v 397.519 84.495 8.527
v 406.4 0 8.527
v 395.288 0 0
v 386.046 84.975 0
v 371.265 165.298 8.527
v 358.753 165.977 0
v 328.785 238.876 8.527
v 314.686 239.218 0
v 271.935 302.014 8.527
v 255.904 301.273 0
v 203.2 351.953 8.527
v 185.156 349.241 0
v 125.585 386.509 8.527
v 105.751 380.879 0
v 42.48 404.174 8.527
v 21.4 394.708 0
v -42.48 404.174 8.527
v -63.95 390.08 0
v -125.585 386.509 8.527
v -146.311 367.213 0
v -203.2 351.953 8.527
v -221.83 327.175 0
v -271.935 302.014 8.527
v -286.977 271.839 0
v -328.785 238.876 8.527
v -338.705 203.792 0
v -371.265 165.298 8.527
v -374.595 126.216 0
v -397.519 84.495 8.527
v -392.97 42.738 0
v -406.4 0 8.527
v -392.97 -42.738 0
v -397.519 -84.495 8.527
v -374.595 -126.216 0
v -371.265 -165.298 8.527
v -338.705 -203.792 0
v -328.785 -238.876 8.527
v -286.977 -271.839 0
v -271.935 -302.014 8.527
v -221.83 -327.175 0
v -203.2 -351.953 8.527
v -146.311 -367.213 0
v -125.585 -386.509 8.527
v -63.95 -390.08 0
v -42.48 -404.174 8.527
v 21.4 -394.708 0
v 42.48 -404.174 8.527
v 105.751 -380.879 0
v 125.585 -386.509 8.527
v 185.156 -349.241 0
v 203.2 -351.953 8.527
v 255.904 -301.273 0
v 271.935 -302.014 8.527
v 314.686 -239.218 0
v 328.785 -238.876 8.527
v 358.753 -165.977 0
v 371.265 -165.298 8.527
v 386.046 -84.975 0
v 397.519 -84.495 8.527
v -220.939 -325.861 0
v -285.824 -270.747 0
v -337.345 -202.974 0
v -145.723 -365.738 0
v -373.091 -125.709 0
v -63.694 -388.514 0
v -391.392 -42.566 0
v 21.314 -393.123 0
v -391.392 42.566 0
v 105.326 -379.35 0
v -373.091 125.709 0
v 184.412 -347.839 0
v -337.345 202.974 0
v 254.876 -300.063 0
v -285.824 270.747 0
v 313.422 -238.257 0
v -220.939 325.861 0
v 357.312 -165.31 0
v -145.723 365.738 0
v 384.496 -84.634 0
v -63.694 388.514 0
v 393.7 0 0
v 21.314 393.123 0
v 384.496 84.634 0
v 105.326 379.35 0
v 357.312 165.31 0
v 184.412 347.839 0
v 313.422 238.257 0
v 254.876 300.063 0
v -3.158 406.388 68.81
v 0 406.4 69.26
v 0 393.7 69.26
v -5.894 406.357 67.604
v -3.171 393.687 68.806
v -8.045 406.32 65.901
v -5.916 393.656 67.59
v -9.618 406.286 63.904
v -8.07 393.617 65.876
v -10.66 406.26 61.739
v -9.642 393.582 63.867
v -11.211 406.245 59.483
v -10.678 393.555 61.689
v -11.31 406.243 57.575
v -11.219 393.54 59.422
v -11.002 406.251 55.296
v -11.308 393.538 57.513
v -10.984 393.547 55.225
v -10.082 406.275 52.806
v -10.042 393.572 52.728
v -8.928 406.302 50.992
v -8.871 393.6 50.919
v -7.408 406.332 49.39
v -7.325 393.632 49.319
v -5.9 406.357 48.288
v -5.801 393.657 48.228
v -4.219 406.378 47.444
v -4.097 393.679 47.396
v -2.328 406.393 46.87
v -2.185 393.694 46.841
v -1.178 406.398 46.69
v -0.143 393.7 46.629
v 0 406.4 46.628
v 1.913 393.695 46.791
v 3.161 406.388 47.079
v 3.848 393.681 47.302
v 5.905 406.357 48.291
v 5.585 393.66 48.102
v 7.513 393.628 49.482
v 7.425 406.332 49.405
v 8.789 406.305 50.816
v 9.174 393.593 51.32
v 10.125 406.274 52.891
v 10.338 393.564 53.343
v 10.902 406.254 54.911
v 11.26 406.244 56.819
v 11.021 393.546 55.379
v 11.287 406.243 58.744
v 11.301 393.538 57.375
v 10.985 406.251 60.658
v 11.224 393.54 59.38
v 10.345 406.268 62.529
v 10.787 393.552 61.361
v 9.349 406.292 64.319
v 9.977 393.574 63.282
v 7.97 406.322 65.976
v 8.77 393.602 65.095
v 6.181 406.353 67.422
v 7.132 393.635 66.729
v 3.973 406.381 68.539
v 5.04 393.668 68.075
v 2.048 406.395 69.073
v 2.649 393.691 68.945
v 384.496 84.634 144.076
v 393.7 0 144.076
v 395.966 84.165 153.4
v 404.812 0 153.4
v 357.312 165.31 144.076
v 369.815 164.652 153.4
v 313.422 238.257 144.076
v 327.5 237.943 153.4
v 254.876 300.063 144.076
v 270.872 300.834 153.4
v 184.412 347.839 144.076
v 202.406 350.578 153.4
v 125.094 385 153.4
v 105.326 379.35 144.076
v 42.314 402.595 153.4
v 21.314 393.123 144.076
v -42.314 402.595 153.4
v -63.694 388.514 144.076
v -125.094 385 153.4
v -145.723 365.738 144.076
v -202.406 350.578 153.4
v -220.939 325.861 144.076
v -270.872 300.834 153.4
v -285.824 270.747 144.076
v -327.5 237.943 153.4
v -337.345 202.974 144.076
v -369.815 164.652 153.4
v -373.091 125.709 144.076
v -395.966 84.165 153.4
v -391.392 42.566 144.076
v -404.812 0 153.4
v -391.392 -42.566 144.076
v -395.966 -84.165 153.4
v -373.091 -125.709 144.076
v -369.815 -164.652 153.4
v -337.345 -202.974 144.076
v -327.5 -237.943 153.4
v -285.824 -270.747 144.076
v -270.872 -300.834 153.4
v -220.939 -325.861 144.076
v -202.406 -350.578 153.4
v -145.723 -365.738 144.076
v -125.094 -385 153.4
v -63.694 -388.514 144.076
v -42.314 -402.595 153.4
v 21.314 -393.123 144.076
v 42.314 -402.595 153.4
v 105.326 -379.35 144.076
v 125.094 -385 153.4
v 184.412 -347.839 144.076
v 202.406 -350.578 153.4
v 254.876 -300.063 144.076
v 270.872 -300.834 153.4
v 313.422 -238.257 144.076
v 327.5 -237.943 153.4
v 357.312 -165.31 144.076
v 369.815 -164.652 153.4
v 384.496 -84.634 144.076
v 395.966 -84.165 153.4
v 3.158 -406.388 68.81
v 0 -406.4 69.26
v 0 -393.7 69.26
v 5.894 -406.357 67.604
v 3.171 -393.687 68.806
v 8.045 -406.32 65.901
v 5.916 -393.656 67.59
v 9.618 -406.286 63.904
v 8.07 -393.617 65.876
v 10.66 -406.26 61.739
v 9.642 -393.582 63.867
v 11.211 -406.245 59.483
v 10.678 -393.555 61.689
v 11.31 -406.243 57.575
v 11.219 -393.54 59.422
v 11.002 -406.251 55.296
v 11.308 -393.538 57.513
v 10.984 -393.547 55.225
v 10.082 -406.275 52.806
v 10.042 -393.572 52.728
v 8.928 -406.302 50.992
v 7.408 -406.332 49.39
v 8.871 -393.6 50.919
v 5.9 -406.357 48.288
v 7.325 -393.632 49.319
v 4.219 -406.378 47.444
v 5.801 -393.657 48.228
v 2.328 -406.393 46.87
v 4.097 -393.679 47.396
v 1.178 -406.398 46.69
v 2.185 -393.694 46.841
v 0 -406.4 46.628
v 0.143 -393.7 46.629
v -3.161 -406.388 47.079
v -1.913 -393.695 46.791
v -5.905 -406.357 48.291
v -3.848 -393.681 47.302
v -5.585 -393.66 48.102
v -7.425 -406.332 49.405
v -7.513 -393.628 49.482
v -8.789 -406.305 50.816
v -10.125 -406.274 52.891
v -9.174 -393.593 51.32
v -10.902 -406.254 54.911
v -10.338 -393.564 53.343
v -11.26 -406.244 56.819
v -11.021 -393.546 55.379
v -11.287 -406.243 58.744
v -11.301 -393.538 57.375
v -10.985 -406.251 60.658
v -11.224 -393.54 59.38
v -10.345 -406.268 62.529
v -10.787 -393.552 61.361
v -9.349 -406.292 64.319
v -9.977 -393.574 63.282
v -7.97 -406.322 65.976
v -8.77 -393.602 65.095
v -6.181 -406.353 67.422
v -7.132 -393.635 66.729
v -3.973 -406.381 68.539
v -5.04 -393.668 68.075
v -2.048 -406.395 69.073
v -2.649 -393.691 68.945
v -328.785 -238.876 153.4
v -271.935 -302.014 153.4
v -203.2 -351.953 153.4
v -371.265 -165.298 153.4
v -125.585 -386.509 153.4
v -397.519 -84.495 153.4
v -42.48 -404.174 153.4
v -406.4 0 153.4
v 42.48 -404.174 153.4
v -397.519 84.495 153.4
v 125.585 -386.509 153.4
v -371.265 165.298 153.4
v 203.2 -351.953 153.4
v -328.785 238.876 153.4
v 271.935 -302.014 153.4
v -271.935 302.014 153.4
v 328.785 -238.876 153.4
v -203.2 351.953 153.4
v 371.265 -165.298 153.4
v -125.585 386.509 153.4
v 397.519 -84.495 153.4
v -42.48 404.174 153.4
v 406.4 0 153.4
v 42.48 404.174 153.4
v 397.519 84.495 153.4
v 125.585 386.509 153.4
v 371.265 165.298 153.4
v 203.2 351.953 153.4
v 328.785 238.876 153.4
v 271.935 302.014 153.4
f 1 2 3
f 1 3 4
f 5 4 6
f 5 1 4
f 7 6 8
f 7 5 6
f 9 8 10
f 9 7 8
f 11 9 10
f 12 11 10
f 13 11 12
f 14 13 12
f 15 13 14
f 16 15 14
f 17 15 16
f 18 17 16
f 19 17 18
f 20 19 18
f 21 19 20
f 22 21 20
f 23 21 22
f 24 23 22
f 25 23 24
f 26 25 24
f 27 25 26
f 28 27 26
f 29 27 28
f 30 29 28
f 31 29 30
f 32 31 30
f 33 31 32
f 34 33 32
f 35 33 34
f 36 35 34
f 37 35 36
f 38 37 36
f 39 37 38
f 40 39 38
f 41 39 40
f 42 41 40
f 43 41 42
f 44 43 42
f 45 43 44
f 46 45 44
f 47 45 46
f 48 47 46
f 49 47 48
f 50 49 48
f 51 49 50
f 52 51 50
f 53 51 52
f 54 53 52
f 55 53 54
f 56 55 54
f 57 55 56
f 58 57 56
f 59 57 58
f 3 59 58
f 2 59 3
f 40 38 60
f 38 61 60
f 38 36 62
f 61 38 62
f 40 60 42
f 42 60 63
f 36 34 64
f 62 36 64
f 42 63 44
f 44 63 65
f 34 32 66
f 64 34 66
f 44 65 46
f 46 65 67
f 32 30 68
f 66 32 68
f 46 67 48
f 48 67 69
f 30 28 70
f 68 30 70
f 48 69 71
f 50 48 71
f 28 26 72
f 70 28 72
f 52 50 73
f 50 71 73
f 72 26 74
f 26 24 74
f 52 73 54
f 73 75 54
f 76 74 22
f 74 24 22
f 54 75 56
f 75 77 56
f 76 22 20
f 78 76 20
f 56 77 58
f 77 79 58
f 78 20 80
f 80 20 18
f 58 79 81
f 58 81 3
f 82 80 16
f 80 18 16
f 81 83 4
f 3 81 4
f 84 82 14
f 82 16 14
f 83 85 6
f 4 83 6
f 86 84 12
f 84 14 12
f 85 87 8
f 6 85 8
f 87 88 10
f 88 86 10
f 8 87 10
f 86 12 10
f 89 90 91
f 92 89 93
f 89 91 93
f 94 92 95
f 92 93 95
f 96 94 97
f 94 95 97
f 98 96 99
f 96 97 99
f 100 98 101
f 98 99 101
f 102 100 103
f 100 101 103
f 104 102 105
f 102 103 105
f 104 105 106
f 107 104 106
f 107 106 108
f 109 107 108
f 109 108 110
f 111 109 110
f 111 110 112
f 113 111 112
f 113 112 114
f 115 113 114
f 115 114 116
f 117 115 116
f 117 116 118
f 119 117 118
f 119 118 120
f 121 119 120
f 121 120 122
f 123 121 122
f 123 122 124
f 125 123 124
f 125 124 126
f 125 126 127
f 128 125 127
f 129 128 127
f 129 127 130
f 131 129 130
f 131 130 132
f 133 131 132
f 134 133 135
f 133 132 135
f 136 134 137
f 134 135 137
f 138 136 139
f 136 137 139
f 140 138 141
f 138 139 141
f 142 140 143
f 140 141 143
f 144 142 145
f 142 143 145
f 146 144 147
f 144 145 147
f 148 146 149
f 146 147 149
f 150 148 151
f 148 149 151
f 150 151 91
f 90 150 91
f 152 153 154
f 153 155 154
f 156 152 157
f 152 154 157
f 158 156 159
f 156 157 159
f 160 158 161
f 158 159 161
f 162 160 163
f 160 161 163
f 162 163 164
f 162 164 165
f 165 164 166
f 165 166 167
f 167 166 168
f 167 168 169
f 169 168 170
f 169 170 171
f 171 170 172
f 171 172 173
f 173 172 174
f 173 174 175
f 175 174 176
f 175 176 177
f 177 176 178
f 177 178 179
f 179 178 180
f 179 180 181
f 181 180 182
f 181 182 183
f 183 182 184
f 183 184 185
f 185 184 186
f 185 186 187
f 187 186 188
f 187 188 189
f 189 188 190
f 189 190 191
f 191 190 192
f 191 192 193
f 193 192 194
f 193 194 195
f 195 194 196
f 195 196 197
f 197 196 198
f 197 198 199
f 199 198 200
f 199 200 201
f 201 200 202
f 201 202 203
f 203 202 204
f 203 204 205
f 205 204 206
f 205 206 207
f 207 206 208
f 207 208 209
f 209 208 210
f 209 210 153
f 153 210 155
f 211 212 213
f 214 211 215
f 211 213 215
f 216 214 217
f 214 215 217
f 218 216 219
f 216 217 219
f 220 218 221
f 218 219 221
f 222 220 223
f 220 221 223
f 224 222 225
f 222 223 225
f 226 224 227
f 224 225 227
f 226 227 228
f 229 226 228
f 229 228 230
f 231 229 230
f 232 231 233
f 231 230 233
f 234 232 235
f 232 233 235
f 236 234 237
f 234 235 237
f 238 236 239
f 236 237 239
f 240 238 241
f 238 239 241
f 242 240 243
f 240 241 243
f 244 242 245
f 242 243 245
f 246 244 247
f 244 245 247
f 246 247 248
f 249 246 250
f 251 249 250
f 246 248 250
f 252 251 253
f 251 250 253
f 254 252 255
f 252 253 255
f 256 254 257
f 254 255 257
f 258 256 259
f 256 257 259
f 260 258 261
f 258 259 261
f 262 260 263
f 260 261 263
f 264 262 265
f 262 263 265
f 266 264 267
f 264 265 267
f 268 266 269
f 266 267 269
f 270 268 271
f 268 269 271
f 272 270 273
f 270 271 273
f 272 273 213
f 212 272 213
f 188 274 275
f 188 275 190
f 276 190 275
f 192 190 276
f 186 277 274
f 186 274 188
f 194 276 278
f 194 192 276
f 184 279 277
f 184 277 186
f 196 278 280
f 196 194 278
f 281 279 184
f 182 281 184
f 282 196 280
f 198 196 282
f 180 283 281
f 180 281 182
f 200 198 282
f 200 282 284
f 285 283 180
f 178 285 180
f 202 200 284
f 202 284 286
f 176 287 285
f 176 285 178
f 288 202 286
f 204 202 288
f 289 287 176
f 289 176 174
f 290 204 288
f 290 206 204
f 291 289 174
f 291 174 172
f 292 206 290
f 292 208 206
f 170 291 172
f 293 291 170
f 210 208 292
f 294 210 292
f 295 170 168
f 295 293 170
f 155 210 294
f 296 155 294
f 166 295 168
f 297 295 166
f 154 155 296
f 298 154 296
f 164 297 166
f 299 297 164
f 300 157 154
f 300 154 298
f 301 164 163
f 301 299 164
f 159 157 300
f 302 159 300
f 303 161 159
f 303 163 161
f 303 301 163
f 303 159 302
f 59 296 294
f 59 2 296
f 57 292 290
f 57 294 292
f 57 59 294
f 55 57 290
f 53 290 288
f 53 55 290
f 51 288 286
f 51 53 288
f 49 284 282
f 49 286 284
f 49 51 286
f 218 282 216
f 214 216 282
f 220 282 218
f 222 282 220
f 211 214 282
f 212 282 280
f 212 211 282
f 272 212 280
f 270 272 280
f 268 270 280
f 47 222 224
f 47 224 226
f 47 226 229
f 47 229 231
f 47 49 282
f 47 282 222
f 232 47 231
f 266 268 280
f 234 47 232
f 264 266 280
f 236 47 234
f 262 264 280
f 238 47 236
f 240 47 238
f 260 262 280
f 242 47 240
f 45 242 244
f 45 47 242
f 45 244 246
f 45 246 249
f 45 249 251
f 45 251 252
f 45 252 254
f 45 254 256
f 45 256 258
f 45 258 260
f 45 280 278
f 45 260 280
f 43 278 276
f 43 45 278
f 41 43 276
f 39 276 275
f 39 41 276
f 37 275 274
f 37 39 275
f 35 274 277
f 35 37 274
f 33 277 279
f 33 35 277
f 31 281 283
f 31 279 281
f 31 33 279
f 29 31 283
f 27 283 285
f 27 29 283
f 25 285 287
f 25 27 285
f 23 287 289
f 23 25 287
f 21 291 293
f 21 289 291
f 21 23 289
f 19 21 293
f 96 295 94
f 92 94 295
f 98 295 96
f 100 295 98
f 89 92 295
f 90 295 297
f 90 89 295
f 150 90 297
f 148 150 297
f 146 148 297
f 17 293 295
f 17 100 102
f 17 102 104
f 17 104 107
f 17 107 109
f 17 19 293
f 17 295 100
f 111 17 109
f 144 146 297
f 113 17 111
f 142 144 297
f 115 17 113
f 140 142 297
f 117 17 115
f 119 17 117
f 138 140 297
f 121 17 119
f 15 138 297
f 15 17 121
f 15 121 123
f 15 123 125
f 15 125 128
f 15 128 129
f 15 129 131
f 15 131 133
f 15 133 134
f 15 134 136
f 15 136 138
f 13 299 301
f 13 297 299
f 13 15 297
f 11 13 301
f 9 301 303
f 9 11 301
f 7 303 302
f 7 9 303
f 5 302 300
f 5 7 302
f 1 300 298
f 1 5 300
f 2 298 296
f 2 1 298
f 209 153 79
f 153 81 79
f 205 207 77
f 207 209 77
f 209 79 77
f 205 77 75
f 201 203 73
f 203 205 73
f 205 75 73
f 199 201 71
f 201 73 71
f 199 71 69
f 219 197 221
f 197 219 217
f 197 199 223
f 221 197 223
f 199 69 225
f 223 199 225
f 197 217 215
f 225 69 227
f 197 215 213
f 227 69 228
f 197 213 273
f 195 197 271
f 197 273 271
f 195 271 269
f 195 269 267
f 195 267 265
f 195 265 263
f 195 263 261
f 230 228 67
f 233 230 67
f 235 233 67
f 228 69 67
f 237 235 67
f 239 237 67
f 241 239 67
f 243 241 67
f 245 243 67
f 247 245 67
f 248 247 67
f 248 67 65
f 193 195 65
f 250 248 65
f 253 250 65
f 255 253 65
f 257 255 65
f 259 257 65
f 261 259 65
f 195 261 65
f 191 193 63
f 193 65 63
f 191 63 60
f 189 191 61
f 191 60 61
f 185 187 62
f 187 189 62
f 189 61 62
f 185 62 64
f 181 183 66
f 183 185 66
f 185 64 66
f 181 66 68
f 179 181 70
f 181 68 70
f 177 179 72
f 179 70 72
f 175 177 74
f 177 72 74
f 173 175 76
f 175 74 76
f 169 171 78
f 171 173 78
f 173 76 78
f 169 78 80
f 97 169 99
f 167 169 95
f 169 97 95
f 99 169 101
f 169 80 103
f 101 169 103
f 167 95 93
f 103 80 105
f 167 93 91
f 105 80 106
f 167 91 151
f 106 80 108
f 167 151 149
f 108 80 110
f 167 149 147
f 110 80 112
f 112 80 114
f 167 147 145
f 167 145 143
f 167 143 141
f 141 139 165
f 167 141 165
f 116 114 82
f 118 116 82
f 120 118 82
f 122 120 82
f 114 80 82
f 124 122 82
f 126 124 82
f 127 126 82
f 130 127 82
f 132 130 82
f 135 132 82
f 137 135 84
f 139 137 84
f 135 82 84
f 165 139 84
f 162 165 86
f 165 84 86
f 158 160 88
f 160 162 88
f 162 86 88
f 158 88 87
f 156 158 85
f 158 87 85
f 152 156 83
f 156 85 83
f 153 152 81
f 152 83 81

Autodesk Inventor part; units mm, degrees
ref_plane "YZ Plane" through (0, 0, 0) normal (1, 0, 0) x (0, 1, 0)
ref_plane "XY Plane" through (0, 0, 0) normal (0, 0, 1) x (1, 0, 0)
sketch "Sketch1" plane through (0, 0, 0) normal (0, 0, 1) x (1, 0, 0)
  circle A0 centre (0, 0) radius 406.4
  circle A1 centre (0, 0) radius 393.7
  dimension "d0" = 812.8
  dimension "d1" = 787.4
extrude "Extrusion1" add sketch "Sketch1" along normal blind 153.4
chamfer "Chamfer1" distance 11.1125 angle 37.5 1 edges at (-406.4, 0, 0) measured on face at (401.8367, 9.4497, 0)
chamfer "Chamfer2" distance 11.1125 angle 40 1 edges at (-393.7, 0, 153.4) measured on face at (401.8367, 9.4497, 153.4)
ref_plane "Work Plane1" through (0, 406.4, 0) normal (0, 1, 0) x (-1, 0, 0)
sketch "Sketch2" plane through (0, 406.4, 0) normal (0, 1, 0) x (-1, 0, 0)
  point P0 (0, 0)
  point P1 (0, 57.9438)
  dimension "d10" = 57.9438
hole "Hole1" at (0, 406.4, 57.9438) direction (0, -1, 0) diameter 22.6314 depth 23.114 tip angle 118 thread size "3/4" designation "3/4 - 14 NPT" standard "NPT"
pattern_circular "Circular Pattern1" count 2 over 360 about axis through (0, 0, -10) along (0, 0, 1) of "Hole1"
equation "\"d7\" = d4"
equation "\"d4\" = 11.1125"
properties part number "A1-19027-300-01 32in pipe" material "Steel, Mild"
